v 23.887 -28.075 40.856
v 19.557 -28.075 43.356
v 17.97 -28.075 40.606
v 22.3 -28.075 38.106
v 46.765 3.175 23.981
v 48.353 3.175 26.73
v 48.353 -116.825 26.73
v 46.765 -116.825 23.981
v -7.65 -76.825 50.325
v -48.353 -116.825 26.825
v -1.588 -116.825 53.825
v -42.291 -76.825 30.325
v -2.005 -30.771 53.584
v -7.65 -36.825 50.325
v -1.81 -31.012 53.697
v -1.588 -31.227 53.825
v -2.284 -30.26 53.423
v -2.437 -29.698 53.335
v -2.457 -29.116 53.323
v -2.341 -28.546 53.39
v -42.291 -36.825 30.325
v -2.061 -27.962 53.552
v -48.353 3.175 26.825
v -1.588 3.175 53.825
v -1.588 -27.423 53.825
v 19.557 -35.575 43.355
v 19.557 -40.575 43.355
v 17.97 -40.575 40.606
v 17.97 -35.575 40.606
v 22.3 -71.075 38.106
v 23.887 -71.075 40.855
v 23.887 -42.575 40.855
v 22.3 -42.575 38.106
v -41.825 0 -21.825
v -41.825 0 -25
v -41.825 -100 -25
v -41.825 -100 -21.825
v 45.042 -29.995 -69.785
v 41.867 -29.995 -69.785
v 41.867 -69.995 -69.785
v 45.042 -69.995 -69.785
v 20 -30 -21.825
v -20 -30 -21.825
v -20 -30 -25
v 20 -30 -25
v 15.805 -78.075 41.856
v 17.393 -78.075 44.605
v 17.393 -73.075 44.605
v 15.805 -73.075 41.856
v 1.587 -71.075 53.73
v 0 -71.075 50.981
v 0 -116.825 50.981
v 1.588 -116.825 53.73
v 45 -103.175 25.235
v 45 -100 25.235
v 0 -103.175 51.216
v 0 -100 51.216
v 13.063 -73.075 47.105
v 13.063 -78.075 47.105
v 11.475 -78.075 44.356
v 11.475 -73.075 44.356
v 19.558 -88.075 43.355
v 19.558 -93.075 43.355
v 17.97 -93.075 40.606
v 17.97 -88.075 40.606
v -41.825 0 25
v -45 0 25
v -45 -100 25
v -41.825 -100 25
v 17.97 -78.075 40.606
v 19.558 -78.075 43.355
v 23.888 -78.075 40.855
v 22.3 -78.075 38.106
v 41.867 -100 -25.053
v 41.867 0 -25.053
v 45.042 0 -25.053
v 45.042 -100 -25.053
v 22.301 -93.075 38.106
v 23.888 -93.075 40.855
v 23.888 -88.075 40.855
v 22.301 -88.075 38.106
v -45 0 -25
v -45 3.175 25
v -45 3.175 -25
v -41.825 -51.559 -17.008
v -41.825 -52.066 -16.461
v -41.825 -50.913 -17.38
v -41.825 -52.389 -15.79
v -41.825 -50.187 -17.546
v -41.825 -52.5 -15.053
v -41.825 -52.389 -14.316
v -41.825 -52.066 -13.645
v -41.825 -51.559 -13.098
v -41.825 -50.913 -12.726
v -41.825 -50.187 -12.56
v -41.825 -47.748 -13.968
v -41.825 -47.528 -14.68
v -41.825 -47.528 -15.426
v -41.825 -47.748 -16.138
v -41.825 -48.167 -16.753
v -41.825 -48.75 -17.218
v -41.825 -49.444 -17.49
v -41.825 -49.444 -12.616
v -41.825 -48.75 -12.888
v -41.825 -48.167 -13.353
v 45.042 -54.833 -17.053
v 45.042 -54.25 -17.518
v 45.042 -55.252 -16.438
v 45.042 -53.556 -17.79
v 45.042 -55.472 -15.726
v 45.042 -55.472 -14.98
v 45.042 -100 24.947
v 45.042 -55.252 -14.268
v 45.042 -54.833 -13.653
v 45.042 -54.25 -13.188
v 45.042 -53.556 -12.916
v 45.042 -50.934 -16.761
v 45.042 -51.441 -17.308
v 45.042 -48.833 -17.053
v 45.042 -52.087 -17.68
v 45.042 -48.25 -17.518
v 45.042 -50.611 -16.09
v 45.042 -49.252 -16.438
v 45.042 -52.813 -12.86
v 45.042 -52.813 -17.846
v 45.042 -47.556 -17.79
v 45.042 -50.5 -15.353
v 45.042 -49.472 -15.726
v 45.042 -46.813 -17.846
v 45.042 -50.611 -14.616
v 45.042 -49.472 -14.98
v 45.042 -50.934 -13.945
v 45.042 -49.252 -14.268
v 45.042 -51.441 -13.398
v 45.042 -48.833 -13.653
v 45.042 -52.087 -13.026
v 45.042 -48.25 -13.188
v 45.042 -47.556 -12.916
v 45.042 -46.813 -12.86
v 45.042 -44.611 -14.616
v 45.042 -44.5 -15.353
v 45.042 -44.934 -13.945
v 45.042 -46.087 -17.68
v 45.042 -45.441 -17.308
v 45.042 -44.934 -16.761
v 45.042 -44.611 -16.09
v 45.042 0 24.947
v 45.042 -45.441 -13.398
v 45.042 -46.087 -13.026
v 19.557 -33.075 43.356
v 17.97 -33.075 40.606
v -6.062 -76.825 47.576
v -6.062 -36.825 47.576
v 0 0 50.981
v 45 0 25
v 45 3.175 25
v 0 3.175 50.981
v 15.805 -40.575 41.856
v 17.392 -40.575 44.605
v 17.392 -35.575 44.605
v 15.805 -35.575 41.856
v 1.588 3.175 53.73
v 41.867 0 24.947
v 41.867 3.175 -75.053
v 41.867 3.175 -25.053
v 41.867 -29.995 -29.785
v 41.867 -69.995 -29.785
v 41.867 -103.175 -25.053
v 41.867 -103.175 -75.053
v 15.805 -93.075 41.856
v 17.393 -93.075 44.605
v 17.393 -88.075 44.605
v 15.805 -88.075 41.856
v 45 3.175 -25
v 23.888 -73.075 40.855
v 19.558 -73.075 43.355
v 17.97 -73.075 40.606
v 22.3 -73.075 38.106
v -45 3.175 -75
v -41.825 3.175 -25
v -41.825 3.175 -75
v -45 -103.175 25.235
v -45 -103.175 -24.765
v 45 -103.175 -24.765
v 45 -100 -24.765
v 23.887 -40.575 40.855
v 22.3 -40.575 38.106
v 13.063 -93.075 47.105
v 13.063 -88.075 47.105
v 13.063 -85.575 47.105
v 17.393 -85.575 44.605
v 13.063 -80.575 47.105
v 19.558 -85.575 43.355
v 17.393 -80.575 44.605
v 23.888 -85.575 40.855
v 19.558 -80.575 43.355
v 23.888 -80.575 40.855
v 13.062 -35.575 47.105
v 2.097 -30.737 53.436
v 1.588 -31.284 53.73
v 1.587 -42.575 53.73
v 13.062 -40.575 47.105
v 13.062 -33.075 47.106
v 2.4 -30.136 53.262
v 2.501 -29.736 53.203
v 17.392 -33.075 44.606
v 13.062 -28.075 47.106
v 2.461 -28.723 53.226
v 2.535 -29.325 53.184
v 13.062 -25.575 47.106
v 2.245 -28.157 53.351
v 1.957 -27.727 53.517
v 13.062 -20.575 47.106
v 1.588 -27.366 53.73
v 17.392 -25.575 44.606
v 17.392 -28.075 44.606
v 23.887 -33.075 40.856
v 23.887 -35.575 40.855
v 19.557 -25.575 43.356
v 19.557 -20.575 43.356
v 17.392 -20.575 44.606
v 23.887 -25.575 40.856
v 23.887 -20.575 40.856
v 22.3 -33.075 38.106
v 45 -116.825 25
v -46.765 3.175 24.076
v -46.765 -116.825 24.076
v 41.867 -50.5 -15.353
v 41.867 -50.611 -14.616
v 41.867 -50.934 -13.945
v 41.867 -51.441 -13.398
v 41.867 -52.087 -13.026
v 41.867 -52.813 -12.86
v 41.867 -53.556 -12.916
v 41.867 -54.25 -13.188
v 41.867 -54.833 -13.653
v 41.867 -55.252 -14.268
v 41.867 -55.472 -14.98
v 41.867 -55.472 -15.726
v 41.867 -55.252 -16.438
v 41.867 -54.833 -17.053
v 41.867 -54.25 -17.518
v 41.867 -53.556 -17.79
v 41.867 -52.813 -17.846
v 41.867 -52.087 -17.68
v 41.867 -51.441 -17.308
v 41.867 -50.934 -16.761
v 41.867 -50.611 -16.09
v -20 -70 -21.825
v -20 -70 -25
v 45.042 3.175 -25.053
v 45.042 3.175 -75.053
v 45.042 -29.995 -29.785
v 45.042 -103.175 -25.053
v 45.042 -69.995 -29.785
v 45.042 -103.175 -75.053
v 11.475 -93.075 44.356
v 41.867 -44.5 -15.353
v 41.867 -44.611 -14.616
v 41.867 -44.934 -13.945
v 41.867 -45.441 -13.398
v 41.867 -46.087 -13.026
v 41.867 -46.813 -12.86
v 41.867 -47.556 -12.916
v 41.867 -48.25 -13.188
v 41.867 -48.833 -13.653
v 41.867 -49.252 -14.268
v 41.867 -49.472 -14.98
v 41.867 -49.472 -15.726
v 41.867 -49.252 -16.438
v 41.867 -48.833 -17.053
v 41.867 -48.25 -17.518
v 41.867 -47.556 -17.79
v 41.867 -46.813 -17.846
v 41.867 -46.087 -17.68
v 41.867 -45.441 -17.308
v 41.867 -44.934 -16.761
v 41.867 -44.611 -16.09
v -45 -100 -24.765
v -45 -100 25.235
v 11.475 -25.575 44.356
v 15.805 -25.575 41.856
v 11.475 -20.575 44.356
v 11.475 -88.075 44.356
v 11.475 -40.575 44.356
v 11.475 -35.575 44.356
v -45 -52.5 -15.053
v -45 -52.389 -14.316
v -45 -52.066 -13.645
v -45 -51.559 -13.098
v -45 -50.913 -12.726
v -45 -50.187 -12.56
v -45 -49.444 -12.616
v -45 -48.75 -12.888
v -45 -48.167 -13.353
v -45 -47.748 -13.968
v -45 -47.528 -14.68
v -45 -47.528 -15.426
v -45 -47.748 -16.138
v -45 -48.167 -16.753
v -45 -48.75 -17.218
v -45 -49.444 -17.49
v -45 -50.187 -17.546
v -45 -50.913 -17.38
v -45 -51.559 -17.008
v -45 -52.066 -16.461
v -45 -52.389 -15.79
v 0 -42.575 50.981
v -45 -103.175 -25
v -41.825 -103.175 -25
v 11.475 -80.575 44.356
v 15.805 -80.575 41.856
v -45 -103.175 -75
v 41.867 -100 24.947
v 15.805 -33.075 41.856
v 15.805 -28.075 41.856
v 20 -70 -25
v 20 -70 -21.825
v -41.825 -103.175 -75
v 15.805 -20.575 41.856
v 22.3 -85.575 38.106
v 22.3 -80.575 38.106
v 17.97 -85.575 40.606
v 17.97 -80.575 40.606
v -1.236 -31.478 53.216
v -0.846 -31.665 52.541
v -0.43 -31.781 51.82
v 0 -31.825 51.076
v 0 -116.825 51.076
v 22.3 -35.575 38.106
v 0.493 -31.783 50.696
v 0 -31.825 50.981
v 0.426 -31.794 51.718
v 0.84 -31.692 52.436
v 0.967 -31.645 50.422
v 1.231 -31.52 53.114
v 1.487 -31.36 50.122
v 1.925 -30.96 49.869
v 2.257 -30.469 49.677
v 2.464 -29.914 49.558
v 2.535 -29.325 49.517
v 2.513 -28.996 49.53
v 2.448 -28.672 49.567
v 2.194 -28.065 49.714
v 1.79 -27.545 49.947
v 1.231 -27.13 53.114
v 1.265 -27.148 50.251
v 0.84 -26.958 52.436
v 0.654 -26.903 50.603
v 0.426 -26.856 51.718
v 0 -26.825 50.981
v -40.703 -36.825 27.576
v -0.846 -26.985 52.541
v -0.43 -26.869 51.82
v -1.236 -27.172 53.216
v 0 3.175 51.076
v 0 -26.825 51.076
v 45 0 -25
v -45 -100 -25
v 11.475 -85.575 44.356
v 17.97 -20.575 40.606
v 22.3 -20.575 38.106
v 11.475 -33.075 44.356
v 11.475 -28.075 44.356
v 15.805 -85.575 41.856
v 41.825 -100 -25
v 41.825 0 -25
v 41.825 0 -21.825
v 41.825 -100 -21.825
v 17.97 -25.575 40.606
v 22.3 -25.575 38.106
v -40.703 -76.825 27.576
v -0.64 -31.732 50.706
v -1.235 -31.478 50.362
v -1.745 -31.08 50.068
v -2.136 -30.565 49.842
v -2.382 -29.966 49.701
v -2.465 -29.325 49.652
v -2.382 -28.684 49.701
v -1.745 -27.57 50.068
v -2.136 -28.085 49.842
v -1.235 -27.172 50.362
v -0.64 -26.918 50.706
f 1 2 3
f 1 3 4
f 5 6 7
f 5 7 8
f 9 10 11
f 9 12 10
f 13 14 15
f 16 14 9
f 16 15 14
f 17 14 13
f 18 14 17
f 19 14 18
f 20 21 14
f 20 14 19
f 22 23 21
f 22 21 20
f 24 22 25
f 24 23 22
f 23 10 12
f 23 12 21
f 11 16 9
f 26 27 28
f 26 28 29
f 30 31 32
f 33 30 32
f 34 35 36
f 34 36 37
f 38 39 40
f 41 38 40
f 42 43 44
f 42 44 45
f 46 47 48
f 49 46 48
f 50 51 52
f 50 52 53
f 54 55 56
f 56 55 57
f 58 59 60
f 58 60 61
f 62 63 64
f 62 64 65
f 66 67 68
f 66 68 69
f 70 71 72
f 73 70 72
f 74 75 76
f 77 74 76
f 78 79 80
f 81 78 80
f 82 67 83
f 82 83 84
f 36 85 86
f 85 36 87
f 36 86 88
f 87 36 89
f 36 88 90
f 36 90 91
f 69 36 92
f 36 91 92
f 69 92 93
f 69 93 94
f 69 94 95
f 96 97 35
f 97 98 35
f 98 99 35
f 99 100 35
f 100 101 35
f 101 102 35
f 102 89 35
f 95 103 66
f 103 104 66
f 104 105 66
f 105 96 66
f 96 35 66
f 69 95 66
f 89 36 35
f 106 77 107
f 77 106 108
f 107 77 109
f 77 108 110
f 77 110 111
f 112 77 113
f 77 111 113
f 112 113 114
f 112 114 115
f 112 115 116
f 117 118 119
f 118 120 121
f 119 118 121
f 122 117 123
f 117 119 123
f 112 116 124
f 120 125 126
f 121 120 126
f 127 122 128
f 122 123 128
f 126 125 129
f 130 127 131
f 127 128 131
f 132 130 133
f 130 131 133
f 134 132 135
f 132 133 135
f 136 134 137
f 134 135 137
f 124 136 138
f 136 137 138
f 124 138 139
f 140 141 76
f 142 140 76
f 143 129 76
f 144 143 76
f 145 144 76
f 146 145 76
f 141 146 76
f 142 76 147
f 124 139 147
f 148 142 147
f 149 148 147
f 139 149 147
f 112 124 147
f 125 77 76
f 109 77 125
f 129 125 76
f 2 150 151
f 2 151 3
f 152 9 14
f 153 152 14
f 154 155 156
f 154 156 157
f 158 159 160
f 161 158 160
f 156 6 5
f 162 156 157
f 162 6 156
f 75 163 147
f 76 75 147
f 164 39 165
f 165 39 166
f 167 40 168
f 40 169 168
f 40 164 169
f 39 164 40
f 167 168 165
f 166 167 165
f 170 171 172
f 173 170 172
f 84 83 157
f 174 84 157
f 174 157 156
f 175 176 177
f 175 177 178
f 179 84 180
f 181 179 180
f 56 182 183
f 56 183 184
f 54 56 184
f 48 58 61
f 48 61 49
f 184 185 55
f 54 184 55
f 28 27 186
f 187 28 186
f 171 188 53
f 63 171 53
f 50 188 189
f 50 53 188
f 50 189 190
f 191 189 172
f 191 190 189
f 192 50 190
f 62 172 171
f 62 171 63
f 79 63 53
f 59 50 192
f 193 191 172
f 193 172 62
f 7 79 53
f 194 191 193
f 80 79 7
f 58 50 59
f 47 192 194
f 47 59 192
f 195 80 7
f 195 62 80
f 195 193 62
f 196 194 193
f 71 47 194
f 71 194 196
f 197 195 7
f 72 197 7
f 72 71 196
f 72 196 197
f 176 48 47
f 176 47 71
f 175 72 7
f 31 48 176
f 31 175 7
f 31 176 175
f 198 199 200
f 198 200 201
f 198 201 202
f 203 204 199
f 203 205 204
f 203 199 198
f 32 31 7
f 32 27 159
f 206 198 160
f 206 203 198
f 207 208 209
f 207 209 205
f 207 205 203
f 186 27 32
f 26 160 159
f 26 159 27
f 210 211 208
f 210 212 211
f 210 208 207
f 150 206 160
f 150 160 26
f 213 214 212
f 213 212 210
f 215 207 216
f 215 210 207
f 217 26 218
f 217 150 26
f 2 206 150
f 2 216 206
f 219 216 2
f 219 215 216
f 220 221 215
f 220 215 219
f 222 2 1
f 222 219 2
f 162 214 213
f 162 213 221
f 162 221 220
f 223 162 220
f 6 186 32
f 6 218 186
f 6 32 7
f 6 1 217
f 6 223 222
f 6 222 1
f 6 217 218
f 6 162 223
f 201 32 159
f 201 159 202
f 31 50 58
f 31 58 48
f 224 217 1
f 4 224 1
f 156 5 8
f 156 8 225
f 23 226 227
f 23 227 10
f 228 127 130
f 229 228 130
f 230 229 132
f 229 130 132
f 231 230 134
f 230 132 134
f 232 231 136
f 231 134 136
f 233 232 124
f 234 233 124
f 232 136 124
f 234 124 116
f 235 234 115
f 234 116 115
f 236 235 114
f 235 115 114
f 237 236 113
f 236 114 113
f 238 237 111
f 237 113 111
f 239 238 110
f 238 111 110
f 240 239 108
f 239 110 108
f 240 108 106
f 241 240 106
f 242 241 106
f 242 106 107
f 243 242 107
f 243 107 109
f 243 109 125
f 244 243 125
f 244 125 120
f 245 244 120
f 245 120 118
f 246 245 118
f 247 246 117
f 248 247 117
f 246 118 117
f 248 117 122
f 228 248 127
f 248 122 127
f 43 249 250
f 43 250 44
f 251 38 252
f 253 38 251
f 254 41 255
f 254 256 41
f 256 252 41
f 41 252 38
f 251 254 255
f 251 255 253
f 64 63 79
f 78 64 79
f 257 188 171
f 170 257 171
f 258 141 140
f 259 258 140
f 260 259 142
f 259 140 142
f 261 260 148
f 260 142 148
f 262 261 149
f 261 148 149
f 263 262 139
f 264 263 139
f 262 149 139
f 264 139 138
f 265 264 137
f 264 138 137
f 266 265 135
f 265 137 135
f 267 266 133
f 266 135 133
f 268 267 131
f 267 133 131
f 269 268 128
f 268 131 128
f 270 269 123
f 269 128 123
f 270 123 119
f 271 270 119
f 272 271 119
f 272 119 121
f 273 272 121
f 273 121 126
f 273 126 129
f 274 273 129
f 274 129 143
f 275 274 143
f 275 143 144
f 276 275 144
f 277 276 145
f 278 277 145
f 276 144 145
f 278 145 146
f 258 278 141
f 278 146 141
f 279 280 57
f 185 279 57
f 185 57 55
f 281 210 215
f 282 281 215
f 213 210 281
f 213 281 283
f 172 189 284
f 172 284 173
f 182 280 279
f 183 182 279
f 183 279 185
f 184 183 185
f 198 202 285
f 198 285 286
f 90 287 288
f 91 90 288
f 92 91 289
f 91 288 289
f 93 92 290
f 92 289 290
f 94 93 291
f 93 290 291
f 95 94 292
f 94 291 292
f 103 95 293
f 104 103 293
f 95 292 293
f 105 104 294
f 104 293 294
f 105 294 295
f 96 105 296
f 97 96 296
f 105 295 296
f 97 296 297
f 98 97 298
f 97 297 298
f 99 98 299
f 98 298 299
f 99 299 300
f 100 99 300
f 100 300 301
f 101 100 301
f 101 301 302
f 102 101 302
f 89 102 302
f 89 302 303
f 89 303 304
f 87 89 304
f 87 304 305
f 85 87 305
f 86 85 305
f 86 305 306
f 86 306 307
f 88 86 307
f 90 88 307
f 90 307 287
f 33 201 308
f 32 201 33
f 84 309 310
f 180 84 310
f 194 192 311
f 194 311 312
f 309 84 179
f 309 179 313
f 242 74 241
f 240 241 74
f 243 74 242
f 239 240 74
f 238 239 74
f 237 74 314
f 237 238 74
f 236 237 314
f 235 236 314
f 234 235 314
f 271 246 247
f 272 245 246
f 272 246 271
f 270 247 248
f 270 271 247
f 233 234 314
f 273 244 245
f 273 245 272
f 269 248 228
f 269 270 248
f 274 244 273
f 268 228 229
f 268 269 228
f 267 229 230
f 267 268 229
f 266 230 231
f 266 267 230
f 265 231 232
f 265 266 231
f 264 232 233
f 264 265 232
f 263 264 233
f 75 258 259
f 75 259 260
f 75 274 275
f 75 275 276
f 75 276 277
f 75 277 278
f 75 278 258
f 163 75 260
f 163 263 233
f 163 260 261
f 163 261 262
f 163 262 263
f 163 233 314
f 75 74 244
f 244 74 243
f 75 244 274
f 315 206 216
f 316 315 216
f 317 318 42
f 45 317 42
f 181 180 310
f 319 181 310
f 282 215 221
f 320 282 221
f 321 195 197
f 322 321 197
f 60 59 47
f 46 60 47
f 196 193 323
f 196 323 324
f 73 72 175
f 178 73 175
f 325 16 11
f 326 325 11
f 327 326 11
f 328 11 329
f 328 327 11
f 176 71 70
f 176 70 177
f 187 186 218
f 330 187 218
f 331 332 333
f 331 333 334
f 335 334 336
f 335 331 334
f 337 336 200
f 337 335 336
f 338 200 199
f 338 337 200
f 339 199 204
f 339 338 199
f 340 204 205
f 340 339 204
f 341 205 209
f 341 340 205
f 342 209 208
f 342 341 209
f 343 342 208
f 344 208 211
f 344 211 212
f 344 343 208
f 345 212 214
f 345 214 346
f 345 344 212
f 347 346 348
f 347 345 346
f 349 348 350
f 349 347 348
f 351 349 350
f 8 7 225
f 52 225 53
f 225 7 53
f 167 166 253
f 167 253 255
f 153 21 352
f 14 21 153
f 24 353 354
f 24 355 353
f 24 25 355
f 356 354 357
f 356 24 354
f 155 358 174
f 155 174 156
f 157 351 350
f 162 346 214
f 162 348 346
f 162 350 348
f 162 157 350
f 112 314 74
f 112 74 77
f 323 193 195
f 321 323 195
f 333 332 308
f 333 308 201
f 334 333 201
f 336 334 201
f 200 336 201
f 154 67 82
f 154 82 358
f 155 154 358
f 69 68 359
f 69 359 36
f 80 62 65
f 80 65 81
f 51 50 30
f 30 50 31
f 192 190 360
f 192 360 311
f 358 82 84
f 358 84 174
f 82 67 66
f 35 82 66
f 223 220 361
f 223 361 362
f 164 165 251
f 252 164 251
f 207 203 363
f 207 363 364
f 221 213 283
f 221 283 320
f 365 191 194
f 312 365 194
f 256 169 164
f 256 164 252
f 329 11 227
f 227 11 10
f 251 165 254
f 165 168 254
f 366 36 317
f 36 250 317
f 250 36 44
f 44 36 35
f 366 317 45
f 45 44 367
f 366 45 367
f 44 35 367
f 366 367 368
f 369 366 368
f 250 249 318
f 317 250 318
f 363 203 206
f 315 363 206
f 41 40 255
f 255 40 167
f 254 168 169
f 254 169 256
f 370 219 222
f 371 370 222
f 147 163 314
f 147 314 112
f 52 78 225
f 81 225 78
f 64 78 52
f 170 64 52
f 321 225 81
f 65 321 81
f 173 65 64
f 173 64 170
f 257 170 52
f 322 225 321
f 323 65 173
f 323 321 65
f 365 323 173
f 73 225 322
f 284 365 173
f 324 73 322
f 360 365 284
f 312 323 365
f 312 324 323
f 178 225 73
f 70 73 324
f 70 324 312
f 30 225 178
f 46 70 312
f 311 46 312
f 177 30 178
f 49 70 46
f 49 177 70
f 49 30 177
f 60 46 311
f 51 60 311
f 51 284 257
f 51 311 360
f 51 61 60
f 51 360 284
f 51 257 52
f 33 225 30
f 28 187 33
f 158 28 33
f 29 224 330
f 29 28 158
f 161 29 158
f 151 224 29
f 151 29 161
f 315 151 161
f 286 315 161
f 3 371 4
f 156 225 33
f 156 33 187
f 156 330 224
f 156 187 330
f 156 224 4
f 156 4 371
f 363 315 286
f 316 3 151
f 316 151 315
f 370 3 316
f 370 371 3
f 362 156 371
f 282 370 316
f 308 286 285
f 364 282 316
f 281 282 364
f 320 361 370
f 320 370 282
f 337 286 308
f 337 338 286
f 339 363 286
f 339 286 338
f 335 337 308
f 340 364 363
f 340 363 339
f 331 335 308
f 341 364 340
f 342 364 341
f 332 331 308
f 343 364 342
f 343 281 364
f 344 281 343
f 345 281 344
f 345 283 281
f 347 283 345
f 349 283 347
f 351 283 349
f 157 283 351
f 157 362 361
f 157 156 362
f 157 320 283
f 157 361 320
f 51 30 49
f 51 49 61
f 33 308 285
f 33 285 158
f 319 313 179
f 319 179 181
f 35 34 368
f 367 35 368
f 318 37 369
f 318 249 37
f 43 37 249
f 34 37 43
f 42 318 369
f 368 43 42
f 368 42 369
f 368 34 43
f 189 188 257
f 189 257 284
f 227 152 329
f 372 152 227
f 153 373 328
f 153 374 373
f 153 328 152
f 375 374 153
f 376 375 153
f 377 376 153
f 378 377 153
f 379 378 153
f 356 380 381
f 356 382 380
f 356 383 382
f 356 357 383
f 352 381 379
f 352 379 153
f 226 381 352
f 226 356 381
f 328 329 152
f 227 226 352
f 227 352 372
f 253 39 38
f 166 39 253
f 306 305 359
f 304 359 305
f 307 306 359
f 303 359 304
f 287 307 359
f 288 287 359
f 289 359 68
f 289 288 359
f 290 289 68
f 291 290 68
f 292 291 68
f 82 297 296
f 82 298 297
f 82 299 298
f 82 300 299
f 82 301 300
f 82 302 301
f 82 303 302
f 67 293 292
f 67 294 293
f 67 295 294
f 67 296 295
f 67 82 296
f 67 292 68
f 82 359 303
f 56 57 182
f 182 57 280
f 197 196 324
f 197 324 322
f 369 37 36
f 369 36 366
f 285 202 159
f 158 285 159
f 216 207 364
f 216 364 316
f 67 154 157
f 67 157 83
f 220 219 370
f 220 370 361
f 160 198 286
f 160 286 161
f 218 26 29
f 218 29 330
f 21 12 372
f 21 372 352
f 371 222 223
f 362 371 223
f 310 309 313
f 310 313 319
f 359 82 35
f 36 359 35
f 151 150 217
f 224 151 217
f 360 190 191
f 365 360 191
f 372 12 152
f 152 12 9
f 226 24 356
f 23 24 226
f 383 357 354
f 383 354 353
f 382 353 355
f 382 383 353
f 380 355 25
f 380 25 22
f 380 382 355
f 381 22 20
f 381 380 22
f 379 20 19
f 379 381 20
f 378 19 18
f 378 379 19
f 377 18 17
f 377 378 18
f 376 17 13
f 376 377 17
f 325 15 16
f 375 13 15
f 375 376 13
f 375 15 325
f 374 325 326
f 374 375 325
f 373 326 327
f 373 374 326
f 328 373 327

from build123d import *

# Parameters (mm, degrees)
F1_DEPTH       = 3.175
F2_W           = 3.175
F2_H           = 50
F3_DEPTH       = 100
F4_W           = 3.175
F4_H           = 50
F5_DEPTH       = 100
F7_DEPTH       = 3.175
F8_W           = 83.65
F8_H           = 3.175
F9_DEPTH       = 100
F10_W          = 3.175
F10_H          = 50
F11_DEPTH      = 103.175
F11_DEPTH_BACK = 3.175
F12_W          = 40
F12_H          = 40
F13_DEPTH      = 25
F15_DEPTH      = 120
F18_DEPTH      = 120
F19_W          = 40
F19_H          = 40
F20_DEPTH      = 25
F21_R          = 2.5
F22_DEPTH      = 3.175
F23_W          = 5
F23_H          = 5
F23_W_2        = 25.7498108172
F23_H_2        = 28.499999997
F24_DEPTH      = 3.175
F25_R          = 2.5
F26_DEPTH      = 53.8262042049
F27_W          = 40
F27_H          = 40
F28_DEPTH      = 25
F29_W          = 3.175
F29_H          = 106.35
F30_DEPTH      = 50
F31_R          = 2.5
F32_DEPTH      = 25


# Not quite as in the source:
# - a length typed as a fraction of an inch, garbled in the dataset ("3 / 203.2 mm" for 3/8 in), is restored


with BuildPart() as f1:
    # F0 (on Front) → F1 (new body)
    with BuildSketch(Plane.XZ):
        Polygon((-45, 25), (-45, -25), (45, -25), (45, 25), (0, 25), align=None)
        Polygon((0, 50.9807621135), (-45, 25), (0, 25), align=None)
        Polygon((0, 25), (45, 25), (0, 50.9807621135), align=None)
    extrude(amount=-F1_DEPTH)


with BuildPart() as f3:
    # F2 (on Front) → F3 (new body)
    with BuildSketch(Plane.XZ):
        with Locations((43.454606086, -0.0529892971)):
            Rectangle(F2_W, F2_H)
    extrude(amount=F3_DEPTH)

    # F21 (on face) → F22 (cut, through all)
    with BuildSketch(Plane.YZ.offset(45.042106086)):
        with Locations((-53, -15.3529893)):
            Circle(F21_R)
        with Locations((-47, -15.3529893)):
            Circle(F21_R)
    extrude(amount=-F22_DEPTH, mode=Mode.SUBTRACT)


with BuildPart() as f5:
    # F4 (on Front) → F5 (new body)
    with BuildSketch(Plane.XZ):
        with Locations((-43.4125, 0)):
            Rectangle(F4_W, F4_H)
    extrude(amount=F5_DEPTH)

    # F31 (on face) → F32 (cut)
    with BuildSketch(Plane(origin=(-45, 0, 0), x_dir=(0, -1, 0), z_dir=(-1, 0, 0))):
        with Locations((50, -15.05299)):
            Circle(F31_R)
    extrude(amount=-F32_DEPTH, mode=Mode.SUBTRACT)


with BuildPart() as f7:
    # F6 (on face) → F7 (new body)
    with BuildSketch(Plane.XZ.offset(100)):
        Polygon((-1.9791e-06, 51.2161863094), (-45.0000019791, 25.2354241958), (-1.9791e-06, 25.2354241958), align=None)
        Polygon((-1.9791e-06, 25.2354241958), (-45.0000019791, 25.2354241958), (-45.0000019791, -24.7645758042), (44.9999980209, -24.7645758042), (44.9999980209, 25.2354241958), align=None)
        Polygon((-1.9791e-06, 51.2161863094), (-1.9791e-06, 25.2354241958), (44.9999980209, 25.2354241958), align=None)
    extrude(amount=F7_DEPTH)


with BuildPart() as f9:
    # F8 (on Front) → F9 (new body)
    with BuildSketch(Plane.XZ):
        with Locations((0, -23.4125)):
            Rectangle(F8_W, F8_H)
    extrude(amount=F9_DEPTH)

    # F12 (on Top) → F13 (cut, through all)
    with BuildSketch(Plane.XY):
        with Locations((0, -50)):
            Rectangle(F12_W, F12_H)
    extrude(amount=-F13_DEPTH, mode=Mode.SUBTRACT)


with BuildPart() as f11:
    # F10 (on Front) → F11 (new body, two sides)
    with BuildSketch(Plane.XZ) as f11_sk:
        with Locations((43.454606086, -50.0529892971)):
            Rectangle(F10_W, F10_H)
    extrude(amount=F11_DEPTH)
    extrude(f11_sk.sketch, amount=-F11_DEPTH_BACK)

    # F27 (on face) → F28 (cut)
    with BuildSketch(Plane(origin=(41.867106086, 0, 0), x_dir=(0, -1, 0), z_dir=(-1, 0, 0))):
        with Locations((49.995, -49.7845411301)):
            Rectangle(F27_W, F27_H)
    extrude(amount=-F28_DEPTH, mode=Mode.SUBTRACT)


with BuildPart() as f15:
    # F14 (on face) → F15 (new body)
    with BuildSketch(Plane(origin=(0, 3.175, 0), x_dir=(-1, 0, 0), z_dir=(0, 1, 0))):
        Polygon((1.5875, 53.8252042049), (0, 51.0755735479), (46.7653718044, 24.0755735479), (48.3528718044, 26.8252042049), align=None)
    extrude(amount=-F15_DEPTH)

    # F19 (on face) → F20 (cut)
    with BuildSketch(Plane(origin=(-23.7038721027, 0, 41.0563108179), x_dir=(0.8660254038, 0, 0.5), z_dir=(-0.5, 0, 0.8660254038))):
        with Locations((-1.4622132261, -56.825)):
            Rectangle(F19_W, F19_H)
    extrude(amount=-F20_DEPTH, mode=Mode.SUBTRACT)


with BuildPart() as f18:
    # F17 (on face) → F18 (new body)
    with BuildSketch(Plane(origin=(0, 3.175, 0), x_dir=(-1, 0, 0), z_dir=(0, 1, 0))):
        Polygon((-48.3528718044, 26.7303927705), (-46.7653718044, 23.9807621135), (-45, 25), (0, 50.9807621135), (-1.5875, 53.7303927705), align=None)
    extrude(amount=-F18_DEPTH)

    # F23 (on face) → F24 (cut, through all)
    with BuildSketch(Plane(origin=(23.6628175473, 0, 40.9852022422), x_dir=(0.8660254038, 0, -0.5), z_dir=(0.5, 0, 0.8660254038))):
        with Locations((-9.7399080962, -90.575)):
            Rectangle(F23_W, F23_H)
        with Locations((-9.7400026881, -83.0750000006)):
            Rectangle(F23_W, F23_H)
        with Locations((-9.74009728, -75.5750000012)):
            Rectangle(F23_W, F23_H)
        with Locations((-9.7405702396, -38.0750000042)):
            Rectangle(F23_W, F23_H)
        with Locations((-9.7406648315, -30.5750000048)):
            Rectangle(F23_W, F23_H)
        with Locations((-9.7407594235, -23.0750000054)):
            Rectangle(F23_W, F23_H)
        with Locations((-2.2399080962, -90.575)):
            Rectangle(F23_W, F23_H)
        with Locations((-2.2400026881, -83.0750000006)):
            Rectangle(F23_W, F23_H)
        with Locations((-2.24009728, -75.5750000012)):
            Rectangle(F23_W, F23_H)
        with Locations((-2.2405702396, -38.0750000042)):
            Rectangle(F23_W, F23_H)
        with Locations((-2.2406648315, -30.5750000048)):
            Rectangle(F23_W, F23_H)
        with Locations((-2.2407594235, -23.0750000054)):
            Rectangle(F23_W, F23_H)
        with Locations((-12.6154756482, -56.8250000027)):
            Rectangle(F23_W_2, F23_H_2)
    extrude(amount=-F24_DEPTH, mode=Mode.SUBTRACT)


with BuildPart() as f26_tool:
    # F25 (on Top) → F26 (new body, through all)
    with BuildSketch(Plane.XY):
        with Locations((0.0346281956, -29.325)):
            Circle(F25_R)
    extrude(amount=F26_DEPTH)


with BuildPart() as f15_1:
    add(f15.part)

    # F26: cut by f26_tool
    add(f26_tool.part, mode=Mode.SUBTRACT)


with BuildPart() as f18_1:
    add(f18.part)

    # F26: cut by f26_tool
    add(f26_tool.part, mode=Mode.SUBTRACT)


with BuildPart() as f30:
    # F29 (on face) → F30 (new body)
    with BuildSketch(Plane(origin=(0, 0, -25), x_dir=(1, 0, 0), z_dir=(0, 0, -1))):
        with Locations((-43.4125, 50)):
            Rectangle(F29_W, F29_H)
    extrude(amount=F30_DEPTH)


solid = Compound([f1.part, f3.part, f5.part, f7.part, f9.part, f11.part, f15_1.part, f18_1.part, f30.part])
